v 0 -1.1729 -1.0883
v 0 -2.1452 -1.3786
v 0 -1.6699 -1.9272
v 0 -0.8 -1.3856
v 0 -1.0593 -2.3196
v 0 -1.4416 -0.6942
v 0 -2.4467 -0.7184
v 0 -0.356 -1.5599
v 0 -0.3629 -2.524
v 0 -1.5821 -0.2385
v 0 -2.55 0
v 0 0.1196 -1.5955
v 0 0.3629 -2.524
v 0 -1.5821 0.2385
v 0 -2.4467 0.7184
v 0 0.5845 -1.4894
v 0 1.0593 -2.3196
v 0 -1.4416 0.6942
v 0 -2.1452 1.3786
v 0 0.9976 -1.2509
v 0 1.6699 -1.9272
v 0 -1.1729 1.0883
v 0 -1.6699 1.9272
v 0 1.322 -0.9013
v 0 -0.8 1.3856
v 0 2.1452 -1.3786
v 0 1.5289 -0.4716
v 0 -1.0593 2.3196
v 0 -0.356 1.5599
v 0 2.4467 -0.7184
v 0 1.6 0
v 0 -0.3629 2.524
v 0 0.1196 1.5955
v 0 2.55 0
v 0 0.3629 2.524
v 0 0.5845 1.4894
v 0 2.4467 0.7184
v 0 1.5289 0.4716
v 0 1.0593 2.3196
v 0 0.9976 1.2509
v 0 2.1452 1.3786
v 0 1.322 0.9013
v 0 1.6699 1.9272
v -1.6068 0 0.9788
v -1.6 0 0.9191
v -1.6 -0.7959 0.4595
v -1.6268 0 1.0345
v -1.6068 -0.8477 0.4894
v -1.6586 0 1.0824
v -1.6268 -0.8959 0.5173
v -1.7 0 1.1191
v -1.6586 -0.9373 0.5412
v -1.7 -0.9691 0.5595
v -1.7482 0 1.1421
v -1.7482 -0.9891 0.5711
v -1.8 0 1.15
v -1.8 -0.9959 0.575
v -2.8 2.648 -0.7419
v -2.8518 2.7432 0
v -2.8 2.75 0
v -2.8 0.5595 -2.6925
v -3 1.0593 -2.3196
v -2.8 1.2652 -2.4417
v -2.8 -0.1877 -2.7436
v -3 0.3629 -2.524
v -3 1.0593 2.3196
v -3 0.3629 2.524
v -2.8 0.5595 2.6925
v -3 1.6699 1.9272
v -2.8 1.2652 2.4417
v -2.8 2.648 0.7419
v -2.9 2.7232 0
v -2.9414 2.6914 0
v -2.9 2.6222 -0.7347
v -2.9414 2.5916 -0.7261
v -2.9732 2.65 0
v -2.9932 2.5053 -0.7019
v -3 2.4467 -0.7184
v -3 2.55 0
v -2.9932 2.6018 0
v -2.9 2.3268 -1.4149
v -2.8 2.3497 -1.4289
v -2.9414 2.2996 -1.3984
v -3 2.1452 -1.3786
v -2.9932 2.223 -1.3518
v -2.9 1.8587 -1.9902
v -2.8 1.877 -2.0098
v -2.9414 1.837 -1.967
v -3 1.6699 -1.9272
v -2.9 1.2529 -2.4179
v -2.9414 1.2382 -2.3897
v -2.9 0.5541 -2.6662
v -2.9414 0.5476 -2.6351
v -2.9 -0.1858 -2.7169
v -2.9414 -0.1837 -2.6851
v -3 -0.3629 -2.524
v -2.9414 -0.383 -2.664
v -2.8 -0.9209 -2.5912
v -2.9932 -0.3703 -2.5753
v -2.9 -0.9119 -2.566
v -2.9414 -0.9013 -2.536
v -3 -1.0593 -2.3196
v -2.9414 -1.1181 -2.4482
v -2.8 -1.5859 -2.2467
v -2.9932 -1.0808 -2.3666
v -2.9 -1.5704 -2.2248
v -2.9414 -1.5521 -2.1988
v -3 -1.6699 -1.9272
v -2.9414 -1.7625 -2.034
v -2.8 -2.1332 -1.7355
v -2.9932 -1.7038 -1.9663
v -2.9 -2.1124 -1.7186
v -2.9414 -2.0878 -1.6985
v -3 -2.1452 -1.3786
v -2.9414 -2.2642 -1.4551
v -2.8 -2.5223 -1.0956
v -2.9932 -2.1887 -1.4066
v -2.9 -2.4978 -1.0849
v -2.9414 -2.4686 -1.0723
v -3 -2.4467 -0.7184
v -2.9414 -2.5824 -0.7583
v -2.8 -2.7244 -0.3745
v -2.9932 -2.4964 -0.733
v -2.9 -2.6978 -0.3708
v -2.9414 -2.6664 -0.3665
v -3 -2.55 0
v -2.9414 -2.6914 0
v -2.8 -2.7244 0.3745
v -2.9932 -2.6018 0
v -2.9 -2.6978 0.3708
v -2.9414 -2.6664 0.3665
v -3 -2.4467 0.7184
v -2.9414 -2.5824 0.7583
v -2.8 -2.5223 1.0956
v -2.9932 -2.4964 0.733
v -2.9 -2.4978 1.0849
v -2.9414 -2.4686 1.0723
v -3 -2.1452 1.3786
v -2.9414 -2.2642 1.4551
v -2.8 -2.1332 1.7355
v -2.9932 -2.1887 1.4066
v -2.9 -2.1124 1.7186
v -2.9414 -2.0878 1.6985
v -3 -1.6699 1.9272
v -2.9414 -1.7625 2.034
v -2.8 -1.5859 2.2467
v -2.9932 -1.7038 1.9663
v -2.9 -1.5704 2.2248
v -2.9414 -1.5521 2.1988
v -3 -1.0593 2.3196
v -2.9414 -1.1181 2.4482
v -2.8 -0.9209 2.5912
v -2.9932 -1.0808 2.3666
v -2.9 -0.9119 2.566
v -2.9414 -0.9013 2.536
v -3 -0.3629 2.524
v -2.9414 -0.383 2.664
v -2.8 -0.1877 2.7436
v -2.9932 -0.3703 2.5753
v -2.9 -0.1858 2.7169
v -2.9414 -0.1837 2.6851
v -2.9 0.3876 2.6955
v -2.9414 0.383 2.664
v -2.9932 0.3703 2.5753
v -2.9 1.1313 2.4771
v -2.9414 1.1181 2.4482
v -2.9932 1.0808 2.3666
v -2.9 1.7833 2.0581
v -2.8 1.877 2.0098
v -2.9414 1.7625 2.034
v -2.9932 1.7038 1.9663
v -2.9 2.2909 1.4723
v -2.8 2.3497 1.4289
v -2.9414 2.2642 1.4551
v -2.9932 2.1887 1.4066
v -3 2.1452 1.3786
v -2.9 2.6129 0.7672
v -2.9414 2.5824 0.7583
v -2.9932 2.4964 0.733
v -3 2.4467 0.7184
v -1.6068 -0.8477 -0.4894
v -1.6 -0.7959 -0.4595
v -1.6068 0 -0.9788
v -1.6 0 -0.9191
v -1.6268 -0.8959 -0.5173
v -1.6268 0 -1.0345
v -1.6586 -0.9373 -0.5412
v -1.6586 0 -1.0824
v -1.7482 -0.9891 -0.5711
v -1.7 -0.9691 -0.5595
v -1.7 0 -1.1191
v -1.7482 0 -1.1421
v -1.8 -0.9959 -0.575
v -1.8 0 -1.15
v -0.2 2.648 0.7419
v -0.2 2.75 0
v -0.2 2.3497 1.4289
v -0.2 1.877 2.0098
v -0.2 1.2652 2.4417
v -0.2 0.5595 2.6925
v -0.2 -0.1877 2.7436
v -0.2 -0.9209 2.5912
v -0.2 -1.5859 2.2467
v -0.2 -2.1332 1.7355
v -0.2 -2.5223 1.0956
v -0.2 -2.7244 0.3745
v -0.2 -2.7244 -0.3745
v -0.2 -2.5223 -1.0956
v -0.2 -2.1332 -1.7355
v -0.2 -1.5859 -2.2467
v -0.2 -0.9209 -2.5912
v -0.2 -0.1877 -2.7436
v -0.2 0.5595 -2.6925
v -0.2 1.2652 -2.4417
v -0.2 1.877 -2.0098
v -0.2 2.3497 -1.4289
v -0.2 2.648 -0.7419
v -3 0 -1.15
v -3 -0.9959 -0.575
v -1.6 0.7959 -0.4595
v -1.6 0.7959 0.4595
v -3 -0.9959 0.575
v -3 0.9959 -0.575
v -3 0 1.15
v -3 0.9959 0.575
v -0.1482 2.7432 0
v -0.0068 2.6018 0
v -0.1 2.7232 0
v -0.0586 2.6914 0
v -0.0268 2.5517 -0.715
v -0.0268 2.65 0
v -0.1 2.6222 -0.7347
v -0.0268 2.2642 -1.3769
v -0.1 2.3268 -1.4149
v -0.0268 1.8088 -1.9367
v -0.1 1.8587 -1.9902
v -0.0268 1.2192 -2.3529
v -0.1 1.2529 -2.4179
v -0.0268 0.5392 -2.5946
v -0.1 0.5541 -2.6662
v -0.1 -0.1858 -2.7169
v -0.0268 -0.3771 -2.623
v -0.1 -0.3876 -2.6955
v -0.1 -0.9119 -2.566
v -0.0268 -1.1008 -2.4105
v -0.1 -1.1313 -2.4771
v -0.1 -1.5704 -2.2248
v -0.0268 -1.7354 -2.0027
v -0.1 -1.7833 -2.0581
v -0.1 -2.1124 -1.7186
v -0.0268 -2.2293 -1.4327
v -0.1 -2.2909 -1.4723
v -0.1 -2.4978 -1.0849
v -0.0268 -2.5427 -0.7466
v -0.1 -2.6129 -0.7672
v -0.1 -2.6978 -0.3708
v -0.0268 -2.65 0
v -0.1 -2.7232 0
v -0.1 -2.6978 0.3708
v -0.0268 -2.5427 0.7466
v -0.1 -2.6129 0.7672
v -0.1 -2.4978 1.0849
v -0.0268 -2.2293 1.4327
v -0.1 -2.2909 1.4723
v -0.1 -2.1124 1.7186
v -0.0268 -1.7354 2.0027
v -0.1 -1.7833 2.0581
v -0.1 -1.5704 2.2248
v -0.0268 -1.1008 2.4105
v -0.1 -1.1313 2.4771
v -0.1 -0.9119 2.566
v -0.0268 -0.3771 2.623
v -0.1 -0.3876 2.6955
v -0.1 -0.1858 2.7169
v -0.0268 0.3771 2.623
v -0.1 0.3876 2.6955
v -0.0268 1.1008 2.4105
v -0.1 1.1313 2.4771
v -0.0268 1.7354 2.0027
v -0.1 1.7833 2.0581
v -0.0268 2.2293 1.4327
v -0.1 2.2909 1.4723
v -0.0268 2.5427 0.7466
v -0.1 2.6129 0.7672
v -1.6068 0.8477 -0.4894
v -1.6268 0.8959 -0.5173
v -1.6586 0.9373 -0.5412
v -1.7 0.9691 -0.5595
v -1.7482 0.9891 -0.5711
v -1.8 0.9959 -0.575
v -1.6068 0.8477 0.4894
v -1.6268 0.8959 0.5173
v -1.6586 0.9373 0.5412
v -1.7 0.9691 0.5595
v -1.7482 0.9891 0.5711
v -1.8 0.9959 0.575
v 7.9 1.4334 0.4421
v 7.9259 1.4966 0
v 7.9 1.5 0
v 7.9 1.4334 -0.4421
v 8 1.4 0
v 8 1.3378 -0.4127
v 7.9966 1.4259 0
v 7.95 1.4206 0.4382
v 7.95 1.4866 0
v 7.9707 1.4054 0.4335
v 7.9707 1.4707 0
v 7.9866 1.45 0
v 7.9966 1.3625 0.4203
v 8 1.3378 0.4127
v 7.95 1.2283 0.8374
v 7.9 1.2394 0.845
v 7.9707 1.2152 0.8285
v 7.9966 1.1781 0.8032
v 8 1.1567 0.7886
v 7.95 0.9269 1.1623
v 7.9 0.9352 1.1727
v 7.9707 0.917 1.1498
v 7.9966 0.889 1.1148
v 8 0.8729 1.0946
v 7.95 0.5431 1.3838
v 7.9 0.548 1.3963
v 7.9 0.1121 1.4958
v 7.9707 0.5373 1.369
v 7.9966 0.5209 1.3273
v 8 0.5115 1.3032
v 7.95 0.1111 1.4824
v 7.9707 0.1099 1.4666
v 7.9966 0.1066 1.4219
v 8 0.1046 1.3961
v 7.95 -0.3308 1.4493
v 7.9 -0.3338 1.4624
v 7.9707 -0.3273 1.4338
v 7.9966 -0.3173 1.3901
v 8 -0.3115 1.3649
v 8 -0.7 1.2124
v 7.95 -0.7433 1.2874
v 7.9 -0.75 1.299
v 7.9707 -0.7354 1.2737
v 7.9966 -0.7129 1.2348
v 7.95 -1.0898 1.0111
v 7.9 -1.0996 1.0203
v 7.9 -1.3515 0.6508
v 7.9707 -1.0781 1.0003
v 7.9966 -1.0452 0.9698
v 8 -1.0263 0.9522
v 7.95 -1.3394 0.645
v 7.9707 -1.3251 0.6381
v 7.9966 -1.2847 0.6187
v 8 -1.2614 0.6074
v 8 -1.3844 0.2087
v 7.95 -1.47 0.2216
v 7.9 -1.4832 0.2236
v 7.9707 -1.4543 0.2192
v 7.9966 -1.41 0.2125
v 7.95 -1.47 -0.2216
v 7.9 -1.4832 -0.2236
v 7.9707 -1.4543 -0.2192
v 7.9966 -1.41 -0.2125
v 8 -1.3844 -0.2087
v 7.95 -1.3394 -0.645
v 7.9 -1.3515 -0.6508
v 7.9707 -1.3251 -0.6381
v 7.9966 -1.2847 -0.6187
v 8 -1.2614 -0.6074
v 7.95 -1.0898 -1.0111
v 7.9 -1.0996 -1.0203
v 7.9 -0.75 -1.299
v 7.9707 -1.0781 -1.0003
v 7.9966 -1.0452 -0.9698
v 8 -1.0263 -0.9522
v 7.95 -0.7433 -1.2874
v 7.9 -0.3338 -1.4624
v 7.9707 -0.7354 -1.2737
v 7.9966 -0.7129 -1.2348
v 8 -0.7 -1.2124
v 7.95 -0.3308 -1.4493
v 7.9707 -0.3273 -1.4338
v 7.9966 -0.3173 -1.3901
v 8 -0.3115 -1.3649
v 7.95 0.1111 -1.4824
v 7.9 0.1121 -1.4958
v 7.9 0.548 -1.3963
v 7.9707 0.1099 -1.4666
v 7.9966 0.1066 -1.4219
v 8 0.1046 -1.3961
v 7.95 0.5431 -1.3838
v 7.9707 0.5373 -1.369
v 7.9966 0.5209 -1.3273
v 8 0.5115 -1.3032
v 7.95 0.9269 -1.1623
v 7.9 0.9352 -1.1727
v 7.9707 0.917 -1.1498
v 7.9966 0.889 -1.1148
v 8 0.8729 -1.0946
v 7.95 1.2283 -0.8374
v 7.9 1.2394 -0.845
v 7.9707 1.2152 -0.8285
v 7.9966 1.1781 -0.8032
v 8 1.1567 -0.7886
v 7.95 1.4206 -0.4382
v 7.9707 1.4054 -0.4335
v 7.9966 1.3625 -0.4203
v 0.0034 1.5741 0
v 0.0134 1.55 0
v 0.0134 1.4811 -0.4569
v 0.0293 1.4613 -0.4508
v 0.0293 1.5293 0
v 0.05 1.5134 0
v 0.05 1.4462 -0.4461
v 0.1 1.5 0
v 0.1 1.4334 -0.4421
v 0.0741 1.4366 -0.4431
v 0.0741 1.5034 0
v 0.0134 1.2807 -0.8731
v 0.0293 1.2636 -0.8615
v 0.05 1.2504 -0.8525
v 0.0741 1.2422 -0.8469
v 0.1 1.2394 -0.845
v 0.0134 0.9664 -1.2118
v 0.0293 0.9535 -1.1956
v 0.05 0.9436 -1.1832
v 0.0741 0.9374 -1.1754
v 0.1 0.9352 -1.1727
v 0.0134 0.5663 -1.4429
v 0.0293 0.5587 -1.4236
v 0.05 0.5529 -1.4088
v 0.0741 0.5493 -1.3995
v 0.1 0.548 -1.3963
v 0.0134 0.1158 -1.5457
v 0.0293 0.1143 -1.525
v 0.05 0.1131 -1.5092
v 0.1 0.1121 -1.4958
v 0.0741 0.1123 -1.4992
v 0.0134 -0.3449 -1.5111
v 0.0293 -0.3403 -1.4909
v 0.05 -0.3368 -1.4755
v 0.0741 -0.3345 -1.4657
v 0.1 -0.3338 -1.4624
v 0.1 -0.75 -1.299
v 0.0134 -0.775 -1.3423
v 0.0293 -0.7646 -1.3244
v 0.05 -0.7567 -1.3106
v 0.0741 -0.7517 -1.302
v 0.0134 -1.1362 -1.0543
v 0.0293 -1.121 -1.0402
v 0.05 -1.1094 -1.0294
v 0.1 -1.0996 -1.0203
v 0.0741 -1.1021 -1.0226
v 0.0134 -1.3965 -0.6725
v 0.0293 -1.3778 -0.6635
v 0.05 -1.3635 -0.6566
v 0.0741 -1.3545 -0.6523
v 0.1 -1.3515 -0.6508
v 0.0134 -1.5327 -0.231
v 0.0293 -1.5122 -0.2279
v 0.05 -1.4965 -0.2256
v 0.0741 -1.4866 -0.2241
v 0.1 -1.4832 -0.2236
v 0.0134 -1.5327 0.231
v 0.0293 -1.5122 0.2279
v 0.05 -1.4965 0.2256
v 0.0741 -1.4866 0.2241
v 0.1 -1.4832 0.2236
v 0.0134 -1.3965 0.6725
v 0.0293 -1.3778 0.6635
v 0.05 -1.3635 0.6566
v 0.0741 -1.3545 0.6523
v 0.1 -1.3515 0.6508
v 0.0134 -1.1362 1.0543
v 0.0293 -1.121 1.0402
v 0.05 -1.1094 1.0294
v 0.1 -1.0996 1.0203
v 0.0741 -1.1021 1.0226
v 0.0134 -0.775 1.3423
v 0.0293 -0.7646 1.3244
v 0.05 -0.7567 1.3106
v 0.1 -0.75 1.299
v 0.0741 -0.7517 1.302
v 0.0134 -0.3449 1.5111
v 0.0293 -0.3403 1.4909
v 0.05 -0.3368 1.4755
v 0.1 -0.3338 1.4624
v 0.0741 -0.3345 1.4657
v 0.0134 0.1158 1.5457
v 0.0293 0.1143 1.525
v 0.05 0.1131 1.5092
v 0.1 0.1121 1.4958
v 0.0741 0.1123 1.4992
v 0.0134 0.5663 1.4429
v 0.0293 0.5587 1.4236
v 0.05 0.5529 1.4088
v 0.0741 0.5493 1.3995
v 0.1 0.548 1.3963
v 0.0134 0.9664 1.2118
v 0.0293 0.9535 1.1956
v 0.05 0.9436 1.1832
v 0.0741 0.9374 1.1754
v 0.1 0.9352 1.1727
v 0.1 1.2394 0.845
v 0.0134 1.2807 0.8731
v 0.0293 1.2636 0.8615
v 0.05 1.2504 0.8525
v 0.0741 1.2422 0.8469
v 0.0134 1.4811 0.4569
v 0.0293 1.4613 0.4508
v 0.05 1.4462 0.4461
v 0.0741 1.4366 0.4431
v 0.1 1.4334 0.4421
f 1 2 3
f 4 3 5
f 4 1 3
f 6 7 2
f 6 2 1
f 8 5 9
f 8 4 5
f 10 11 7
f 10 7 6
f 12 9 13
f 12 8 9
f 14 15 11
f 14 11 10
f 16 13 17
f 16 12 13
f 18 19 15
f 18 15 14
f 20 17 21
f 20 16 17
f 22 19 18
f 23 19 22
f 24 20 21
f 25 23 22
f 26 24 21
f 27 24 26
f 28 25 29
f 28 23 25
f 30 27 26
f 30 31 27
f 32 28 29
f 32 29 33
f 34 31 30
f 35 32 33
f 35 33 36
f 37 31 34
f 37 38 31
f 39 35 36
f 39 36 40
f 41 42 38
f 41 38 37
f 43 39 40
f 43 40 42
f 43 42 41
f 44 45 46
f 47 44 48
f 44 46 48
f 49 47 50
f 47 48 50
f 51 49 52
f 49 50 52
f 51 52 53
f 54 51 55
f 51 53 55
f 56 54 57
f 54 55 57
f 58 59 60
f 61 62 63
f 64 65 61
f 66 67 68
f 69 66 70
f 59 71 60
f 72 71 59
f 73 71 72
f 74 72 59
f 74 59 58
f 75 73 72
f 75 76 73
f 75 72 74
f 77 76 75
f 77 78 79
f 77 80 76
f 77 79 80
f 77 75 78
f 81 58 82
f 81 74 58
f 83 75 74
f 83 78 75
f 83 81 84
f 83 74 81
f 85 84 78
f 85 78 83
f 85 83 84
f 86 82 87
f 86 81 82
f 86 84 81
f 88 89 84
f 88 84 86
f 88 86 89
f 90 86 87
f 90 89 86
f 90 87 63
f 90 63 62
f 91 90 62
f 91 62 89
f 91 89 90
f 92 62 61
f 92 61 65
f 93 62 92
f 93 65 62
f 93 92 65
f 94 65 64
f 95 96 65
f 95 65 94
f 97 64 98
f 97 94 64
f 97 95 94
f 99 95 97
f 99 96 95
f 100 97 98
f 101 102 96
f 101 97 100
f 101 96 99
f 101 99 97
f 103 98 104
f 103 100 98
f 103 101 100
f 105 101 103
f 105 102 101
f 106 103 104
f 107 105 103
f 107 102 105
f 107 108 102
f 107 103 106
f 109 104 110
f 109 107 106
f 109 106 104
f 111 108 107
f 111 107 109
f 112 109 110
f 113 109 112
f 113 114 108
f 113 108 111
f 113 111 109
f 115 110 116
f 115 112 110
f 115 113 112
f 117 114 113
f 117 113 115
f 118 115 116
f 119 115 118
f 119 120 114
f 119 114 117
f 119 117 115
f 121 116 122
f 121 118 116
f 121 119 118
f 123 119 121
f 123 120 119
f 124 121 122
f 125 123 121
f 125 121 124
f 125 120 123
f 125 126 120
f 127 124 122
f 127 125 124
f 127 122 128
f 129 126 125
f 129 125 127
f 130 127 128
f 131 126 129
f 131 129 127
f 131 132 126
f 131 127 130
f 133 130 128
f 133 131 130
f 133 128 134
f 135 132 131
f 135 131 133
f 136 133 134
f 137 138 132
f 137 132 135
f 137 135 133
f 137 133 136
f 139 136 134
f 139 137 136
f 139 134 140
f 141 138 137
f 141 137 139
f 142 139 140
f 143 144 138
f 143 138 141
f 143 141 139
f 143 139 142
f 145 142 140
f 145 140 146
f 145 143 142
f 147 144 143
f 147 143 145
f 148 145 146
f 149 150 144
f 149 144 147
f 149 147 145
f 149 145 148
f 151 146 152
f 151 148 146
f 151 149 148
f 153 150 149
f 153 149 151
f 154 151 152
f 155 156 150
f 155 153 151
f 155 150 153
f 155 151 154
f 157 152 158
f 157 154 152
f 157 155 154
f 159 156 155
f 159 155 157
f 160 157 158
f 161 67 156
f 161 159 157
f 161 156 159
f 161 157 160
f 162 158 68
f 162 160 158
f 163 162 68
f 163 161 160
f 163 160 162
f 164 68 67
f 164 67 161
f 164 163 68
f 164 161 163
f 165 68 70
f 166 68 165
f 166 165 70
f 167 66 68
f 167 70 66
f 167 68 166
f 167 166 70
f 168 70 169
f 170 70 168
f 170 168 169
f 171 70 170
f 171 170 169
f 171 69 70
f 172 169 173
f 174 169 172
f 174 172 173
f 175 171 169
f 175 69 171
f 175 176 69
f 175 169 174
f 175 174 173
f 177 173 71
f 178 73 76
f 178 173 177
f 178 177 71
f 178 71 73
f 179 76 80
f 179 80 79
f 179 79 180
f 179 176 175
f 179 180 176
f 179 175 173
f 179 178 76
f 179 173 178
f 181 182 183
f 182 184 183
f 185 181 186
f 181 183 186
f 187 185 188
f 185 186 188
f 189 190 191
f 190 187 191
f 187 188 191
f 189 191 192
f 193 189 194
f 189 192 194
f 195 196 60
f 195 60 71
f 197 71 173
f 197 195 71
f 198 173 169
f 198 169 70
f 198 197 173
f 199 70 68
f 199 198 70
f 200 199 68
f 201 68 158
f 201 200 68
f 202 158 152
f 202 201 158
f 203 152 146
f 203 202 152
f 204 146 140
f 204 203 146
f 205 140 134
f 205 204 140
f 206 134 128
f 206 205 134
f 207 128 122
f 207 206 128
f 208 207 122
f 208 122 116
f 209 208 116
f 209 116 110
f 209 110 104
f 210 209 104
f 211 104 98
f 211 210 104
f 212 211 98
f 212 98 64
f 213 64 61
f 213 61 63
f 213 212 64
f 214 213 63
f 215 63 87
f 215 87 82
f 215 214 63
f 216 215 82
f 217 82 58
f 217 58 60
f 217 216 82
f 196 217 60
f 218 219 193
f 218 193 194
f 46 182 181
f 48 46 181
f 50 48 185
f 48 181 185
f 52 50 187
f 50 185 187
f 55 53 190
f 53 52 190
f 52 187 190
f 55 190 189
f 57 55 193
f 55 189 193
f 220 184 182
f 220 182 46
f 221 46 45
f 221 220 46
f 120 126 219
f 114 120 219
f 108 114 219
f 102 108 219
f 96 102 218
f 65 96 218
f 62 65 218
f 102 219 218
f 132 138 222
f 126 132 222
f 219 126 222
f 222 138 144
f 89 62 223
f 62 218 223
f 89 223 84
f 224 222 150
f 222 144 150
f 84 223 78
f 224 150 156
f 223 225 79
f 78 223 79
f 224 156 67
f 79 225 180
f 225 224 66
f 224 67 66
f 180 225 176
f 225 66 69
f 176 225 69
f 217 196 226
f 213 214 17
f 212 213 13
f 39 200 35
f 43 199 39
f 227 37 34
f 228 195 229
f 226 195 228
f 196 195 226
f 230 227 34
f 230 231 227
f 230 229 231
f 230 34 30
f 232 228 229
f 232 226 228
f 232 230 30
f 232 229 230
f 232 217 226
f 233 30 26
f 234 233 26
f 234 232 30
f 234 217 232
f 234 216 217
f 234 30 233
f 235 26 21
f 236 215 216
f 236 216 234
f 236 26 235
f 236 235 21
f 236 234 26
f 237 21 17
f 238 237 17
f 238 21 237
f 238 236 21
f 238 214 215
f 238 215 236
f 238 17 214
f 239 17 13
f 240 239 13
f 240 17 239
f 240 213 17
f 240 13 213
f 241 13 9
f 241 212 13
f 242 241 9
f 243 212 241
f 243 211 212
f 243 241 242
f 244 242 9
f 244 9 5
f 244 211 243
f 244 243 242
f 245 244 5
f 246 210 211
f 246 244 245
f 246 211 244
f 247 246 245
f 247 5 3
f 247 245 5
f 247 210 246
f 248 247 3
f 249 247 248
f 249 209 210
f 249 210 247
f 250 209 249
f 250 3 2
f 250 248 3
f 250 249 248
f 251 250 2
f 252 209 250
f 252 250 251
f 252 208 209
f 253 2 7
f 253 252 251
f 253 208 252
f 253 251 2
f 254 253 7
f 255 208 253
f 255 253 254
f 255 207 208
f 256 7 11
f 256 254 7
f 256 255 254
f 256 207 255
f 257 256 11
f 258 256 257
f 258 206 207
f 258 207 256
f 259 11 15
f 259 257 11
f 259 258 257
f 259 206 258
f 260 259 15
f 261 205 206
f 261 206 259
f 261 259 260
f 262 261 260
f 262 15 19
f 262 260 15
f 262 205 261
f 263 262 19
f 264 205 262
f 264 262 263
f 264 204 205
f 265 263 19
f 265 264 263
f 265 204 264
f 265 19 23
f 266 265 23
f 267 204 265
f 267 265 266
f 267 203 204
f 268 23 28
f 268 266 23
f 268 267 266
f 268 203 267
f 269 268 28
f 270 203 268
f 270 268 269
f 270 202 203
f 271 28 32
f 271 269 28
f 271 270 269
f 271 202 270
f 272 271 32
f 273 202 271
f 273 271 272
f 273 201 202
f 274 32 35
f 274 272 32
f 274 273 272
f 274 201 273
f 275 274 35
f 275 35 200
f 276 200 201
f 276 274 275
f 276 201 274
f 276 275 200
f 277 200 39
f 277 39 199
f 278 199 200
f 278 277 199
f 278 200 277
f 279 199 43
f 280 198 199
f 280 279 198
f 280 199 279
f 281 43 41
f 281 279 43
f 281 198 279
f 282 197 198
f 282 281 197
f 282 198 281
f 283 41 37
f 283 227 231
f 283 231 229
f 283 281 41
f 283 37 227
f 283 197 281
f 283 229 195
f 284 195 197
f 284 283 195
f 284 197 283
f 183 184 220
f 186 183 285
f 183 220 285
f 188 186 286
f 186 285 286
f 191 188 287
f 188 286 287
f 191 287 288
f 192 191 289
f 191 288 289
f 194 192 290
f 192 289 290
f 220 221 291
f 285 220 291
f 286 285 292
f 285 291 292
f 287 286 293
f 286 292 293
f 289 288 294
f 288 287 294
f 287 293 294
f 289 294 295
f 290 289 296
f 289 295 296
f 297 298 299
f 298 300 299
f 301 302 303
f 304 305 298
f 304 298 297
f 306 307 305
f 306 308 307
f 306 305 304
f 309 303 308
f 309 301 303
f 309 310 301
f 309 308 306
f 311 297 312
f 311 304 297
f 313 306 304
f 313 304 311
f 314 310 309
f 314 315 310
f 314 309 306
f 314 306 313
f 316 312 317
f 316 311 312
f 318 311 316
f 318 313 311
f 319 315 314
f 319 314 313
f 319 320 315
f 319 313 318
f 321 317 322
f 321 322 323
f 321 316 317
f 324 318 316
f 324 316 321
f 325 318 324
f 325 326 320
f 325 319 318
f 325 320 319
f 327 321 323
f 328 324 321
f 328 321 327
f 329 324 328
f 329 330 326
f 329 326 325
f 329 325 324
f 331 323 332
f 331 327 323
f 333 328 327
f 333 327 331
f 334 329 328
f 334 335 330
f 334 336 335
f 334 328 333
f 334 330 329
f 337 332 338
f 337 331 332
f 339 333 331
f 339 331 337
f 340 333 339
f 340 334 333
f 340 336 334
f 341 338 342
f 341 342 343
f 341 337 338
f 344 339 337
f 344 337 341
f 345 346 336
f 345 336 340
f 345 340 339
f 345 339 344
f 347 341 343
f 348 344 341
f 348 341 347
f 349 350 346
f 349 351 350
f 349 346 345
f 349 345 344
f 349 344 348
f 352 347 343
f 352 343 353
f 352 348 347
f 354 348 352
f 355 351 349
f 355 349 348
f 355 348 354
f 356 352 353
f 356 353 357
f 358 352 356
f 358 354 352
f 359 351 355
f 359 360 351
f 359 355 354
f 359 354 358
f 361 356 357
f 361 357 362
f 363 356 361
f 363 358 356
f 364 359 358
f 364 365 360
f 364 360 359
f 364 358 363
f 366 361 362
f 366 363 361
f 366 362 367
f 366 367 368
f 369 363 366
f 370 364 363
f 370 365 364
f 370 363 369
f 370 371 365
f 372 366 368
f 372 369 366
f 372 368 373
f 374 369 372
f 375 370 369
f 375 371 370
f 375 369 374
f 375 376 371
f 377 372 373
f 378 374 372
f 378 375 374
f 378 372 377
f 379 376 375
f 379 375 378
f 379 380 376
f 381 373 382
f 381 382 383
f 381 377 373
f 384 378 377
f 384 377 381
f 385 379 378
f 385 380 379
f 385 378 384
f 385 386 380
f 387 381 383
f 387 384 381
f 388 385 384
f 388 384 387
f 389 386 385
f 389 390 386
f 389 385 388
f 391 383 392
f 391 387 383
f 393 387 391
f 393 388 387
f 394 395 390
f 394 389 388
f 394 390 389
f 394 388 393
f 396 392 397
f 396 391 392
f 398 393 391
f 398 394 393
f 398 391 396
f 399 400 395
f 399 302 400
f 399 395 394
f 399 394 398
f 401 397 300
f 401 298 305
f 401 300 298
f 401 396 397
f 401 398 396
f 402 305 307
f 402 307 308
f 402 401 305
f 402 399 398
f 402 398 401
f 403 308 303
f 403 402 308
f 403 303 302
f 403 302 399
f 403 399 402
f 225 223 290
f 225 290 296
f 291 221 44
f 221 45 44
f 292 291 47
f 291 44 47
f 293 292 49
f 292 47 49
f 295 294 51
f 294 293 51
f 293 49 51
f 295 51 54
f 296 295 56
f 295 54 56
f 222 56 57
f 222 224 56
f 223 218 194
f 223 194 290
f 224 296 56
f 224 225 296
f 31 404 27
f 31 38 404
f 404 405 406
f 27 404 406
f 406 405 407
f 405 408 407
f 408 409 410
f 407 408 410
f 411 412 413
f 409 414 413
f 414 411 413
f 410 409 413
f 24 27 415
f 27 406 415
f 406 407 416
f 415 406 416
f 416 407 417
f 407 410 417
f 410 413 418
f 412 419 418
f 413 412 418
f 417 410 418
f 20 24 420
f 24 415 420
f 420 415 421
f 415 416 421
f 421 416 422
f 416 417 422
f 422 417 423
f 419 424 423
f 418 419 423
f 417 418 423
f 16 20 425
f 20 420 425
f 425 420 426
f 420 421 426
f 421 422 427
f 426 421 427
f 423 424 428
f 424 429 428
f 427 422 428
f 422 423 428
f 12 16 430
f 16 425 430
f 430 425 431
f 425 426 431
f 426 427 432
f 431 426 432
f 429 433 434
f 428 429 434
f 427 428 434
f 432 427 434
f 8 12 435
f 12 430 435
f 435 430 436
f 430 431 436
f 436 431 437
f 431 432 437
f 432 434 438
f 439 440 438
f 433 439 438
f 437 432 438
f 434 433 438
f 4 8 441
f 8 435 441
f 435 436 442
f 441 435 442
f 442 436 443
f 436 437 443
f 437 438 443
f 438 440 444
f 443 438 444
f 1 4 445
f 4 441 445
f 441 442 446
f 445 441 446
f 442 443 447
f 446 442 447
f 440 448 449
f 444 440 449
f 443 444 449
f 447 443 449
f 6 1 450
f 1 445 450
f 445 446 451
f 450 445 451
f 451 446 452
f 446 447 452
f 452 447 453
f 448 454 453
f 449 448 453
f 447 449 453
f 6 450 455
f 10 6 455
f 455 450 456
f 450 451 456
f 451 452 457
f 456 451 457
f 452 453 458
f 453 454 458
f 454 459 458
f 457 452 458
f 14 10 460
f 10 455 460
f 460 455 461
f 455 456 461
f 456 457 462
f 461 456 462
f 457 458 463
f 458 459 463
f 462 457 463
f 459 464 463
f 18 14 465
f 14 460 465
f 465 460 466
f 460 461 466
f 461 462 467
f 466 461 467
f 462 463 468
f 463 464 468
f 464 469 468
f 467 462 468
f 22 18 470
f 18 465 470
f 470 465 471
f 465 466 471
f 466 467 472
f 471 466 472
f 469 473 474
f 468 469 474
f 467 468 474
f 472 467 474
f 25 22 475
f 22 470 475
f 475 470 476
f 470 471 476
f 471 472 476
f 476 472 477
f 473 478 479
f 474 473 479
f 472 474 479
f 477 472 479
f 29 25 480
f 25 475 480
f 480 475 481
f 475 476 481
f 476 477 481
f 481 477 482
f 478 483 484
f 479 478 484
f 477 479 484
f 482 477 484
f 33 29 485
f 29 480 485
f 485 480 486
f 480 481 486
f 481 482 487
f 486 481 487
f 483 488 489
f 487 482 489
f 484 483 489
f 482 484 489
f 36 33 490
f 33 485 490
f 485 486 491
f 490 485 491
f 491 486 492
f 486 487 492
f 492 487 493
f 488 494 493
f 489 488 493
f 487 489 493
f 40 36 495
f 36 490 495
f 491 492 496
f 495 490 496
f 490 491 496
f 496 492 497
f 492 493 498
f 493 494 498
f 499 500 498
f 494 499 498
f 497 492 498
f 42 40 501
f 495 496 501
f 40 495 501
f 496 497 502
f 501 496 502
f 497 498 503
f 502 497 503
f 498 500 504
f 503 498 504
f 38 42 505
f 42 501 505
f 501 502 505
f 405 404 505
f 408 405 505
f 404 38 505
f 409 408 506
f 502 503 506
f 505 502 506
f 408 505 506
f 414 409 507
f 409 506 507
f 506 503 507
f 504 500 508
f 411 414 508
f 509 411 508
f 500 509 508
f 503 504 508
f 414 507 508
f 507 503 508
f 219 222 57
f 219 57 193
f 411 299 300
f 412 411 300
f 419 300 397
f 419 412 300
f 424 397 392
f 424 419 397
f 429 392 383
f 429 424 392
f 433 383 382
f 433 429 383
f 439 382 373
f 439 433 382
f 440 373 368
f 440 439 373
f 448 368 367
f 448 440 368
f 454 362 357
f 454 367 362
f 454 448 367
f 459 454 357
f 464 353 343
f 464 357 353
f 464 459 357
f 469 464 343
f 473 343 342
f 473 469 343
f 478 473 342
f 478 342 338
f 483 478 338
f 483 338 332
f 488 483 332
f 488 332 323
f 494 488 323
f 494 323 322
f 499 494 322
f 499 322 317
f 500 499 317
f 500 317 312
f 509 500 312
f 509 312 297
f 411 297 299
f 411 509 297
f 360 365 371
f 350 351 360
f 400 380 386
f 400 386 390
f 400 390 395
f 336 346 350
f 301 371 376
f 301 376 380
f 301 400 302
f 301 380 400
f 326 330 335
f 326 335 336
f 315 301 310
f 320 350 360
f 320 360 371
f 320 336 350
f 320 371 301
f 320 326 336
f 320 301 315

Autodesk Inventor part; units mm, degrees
ref_plane "YZ Plane" through (0, 0, 0) normal (1, 0, 0) x (0, 1, 0)
ref_plane "XZ Plane" through (0, 0, 0) normal (0, 1, 0) x (-1, 0, 0)
ref_plane "XY Plane" through (0, 0, 0) normal (0, 0, 1) x (1, 0, 0)
sketch "スケッチ1" plane through (0, 0, 0) normal (0, 0, 1) x (1, 0, 0)
  line L0 (0, 0) -> (8, 0)
  line L1 (8, 0) -> (8, 1.5)
  line L2 (8, 1.5) -> (0, 1.5)
  line L3 (0, 1.5) -> (0, 0)
  line L4 (0, 0) -> (0, 2.75)
  line L5 (0, 0) -> (-3, 0)
  line L6 (-3, 0) -> (0, 0)
  line L7 (-3, 0) -> (-3, 1.15)
  line L8 (0, 0) -> (-3, 0)
  line L9 (-3, 0) -> (-3, 2.75)
  line L10 (-3, 2.75) -> (0, 2.75)
  line L11 (0, 2.75) -> (0, 0)
  dimension "d0" = 1.5
  dimension "d1" = 8
  dimension "d3" = 3
  dimension "d4" = 2.75
  dimension "d5" = 1.15
revolve "回転1" add sketch "スケッチ1" angle 360 about axis through (-3, 0, 0) along (1, 0, 0)
thread "ねじ1" size "M3x0.5" class "6g" standard "ANSI Metric M Profile" length 100
sketch "スケッチ2" plane through (-3, 0, 0) normal (-1, 0, 0) x (0, 0, 1)
  circle A0 centre (0, 0) radius 1.15 projected
  line L0 (-0.575, 0.9959) -> (0.575, 0.9959)
  line L1 (0.575, 0.9959) -> (1.15, 0)
  line L2 (1.15, 0) -> (0.575, -0.9959)
  line L3 (0.575, -0.9959) -> (-0.575, -0.9959)
  line L4 (-0.575, -0.9959) -> (-1.15, 0)
  line L5 (-1.15, 0) -> (-0.575, 0.9959)
  dimension "d10" = 1.15
  dimension "d11" = 1.9919
extrude "押し出し1" cut sketch "スケッチ2" against normal blind 1.4 contours L2 L3 L4 L5 L0 L1
fillet "フィレット1" radius 0.2 8 edges at (-1.6, 0.9959, 0) (-1.6, 0.498, 0.8625) (-1.6, 0.498, -0.8625) (-1.6, -0.498, -0.8625) (-1.6, -0.9959, 0) (-1.6, -0.498, 0.8625) (-3, -2.75, 0) (0, -2.75, 0)
fillet "フィレット2" radius 0.1 1 edges at (0, -1.5, 0)
fillet "フィレット3" radius 0.1 1 edges at (8, -1.5, 0)
properties part number "ネジアルミM3L8" material "アルミニウム 7075"
